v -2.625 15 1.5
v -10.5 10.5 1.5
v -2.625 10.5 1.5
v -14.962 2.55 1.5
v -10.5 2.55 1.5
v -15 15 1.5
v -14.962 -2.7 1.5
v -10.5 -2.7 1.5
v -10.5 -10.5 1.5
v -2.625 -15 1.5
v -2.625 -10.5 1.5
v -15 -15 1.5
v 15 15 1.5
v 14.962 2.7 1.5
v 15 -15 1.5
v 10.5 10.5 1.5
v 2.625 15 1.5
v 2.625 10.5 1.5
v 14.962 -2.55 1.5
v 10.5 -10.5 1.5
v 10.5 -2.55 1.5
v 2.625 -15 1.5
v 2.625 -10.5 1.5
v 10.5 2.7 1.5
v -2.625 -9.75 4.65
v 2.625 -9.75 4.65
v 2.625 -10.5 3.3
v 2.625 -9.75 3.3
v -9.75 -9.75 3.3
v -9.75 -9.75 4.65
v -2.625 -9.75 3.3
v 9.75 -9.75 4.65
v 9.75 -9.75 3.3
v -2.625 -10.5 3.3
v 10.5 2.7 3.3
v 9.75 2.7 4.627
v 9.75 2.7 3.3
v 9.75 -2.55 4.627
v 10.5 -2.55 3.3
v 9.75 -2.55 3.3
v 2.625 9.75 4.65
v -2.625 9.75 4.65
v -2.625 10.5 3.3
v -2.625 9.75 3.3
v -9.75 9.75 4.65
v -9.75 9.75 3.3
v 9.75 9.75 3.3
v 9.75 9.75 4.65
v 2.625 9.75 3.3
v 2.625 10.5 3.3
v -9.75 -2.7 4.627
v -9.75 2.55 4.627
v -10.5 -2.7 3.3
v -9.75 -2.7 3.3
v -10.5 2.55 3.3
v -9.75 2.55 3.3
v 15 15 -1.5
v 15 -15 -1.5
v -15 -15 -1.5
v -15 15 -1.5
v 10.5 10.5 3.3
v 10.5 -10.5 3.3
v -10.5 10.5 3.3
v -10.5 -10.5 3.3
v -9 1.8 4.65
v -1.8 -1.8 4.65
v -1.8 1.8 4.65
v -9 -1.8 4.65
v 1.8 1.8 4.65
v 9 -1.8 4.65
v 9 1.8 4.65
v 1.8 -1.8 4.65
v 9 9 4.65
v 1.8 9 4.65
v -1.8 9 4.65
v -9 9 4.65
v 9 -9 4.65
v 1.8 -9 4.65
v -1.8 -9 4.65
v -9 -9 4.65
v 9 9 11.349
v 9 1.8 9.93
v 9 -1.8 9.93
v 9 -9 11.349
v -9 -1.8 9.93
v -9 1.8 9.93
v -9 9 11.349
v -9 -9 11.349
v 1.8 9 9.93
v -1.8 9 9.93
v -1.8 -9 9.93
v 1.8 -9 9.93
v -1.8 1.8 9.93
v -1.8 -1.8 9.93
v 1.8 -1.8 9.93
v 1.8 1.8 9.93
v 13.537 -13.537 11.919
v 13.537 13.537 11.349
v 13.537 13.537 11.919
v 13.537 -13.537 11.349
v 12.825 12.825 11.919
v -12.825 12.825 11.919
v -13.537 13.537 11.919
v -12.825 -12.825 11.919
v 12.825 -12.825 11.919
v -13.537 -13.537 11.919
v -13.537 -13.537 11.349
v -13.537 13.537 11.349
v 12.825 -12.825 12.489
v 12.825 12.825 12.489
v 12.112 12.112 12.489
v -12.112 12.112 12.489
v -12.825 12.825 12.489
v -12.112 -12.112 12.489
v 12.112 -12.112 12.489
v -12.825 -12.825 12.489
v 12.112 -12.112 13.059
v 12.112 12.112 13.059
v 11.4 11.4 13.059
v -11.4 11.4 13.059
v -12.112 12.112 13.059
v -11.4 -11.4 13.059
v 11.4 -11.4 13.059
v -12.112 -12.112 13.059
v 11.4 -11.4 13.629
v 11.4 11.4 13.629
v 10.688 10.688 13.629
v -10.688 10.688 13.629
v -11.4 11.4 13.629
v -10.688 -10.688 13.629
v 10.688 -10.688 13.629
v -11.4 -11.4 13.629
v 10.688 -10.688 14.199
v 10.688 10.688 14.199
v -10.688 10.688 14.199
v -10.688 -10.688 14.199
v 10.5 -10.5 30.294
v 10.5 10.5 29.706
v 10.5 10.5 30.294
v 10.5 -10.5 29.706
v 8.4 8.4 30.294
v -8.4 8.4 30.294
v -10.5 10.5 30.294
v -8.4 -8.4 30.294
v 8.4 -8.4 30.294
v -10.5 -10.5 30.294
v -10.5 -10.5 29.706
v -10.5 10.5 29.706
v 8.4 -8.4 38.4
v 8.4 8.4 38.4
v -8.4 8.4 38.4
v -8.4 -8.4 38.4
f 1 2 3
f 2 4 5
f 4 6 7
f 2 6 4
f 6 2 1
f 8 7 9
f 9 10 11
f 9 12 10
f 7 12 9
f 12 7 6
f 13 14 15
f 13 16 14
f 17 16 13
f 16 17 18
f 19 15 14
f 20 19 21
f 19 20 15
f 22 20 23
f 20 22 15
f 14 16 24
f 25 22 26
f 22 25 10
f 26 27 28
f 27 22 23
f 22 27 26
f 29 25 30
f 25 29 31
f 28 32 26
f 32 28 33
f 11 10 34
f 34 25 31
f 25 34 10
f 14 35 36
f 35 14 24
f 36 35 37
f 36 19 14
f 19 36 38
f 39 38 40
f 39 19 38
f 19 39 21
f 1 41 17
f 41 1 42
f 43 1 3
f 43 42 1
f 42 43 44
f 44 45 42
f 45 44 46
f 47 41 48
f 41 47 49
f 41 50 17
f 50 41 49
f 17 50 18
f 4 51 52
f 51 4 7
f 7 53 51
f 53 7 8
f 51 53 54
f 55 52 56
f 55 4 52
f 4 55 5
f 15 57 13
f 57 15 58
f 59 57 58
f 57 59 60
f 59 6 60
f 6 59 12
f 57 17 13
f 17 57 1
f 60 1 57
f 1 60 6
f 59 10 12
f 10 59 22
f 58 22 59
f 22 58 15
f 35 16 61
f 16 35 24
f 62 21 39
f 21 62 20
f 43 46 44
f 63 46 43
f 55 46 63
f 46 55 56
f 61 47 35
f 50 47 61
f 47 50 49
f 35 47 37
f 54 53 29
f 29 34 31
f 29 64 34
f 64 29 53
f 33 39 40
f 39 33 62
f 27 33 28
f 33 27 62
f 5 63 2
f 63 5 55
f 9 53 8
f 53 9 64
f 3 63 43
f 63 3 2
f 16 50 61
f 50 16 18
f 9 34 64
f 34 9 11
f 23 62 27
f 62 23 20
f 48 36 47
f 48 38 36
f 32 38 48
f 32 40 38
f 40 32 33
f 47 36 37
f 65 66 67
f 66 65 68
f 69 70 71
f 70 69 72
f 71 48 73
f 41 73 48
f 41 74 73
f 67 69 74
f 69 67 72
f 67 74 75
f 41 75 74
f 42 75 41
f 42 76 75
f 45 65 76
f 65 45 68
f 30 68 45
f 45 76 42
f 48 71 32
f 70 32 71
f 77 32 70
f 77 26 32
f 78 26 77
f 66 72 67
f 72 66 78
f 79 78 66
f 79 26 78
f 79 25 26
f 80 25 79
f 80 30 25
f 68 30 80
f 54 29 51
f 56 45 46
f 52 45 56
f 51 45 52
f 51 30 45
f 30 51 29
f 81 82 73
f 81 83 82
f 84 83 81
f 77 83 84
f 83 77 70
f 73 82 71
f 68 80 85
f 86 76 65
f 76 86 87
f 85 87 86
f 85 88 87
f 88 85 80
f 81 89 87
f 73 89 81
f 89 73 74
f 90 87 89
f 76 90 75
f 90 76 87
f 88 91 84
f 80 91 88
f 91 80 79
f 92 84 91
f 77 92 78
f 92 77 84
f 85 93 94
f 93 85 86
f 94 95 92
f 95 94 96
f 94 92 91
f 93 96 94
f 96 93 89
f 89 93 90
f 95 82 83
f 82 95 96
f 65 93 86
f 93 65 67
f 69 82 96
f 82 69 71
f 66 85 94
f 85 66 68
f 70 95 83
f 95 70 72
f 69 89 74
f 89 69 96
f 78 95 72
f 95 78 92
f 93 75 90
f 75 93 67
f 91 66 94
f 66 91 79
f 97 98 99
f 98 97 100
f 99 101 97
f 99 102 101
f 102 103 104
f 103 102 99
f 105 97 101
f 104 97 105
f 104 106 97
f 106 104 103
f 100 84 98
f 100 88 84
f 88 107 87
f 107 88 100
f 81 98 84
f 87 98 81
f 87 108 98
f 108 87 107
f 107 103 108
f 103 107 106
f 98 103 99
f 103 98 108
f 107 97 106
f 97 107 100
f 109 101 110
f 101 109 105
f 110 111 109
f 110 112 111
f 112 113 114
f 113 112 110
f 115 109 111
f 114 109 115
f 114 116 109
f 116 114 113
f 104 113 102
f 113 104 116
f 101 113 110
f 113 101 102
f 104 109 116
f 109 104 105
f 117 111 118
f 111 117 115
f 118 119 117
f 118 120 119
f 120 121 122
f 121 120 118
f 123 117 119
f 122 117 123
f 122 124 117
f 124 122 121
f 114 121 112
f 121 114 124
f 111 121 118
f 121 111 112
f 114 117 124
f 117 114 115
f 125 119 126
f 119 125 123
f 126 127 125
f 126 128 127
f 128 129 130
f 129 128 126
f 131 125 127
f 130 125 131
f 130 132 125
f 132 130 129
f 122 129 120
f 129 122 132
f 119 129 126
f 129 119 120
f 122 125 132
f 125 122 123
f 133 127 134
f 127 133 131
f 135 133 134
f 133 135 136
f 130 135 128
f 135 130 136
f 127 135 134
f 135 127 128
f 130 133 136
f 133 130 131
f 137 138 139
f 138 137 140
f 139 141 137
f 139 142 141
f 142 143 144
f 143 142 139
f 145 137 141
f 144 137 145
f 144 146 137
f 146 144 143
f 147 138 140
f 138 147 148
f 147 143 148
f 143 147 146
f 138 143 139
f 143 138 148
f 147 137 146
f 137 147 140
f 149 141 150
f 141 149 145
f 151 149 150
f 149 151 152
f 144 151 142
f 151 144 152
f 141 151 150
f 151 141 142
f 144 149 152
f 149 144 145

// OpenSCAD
// Adjust base width
base_w = 30;

// Adjust level no.
lvl_no = 3;

module elongate(){
    for (i = [0 : $children-1]){
            scale([10 , 1, 1 ]) child(i);
    }
}

module prism(l, w, h){
    polyhedron(
        points=[[0,0,0], [l,0,0], [l,w,0], [0,w,0], [0,w,h], [l,w,h]],
        faces=[[0,1,2,3],[5,4,3,2],[0,4,5,1],[0,3,4],[5,2,1]]
    );
}

module pagoda_base(){
    b1_w = base_w;
    b2_w = base_w*0.7;
    b3_w = base_w*0.65;
    
    st_w = (b1_w - b3_w) / 2;
    st_l = b2_w * 0.25;
    st_h = b1_w *1.05 / 10;
    
    tx = [-1, 5.7, 1, -5.7];
    ty = [-1, -0.17, 1, 0.17];
    
    union(){
        //Base 1
        cube([base_w,base_w,base_w/10],center=true);
        
        //Base 2
        translate([0,0,base_w*0.7/10]){
            cube([b2_w,b2_w,base_w*0.8/10],center=true);
        }
        
        //Base 3
        translate([0,0,2* base_w*0.6/10]){
            cube([b3_w,b3_w,base_w*0.7/10],center=true);
        }
        
        //Stairs
        for (i = [0:3]) {
            translate([tx[i] * st_w/2, ty[i] * b1_w/2, b1_w/20]){
                rotate(a = 90  * i) prism(st_l,st_w,st_h);
            }
        }
    }
}

module pagoda_body(b_w){
    body_w = b_w * 0.6;
    body_h = body_w * 0.7; 
    
    roof_w = b_w * 0.95;
    thicc = roof_w*0.1;
    union(){
        
        difference(){
            cube([body_w, body_w, body_h],center = true);
            cube([body_w*1.1, body_w * 0.2, body_h * 0.6],center=true);
            cube([body_w*0.2, body_w * 1.1, body_h * 0.6],center=true);
        };
        
        
        translate([0,0,body_h*0.39]){
            thicc = thicc * 0.2;
            union(){
            for (i = [1:5]){
                translate([0,0, thicc*i]){
                    cube([roof_w * (1-(0.05*i)),roof_w * (1-(0.05*i)),thicc],center=true);
                }
            } 
            }
        }

    }  
}

module pagoda_recur_body(b_w){
    body_w = b_w * 0.7;
    body_h = body_w * 0.4; 
    
    roof_w = b_w * 0.98;
    thicc = roof_w*0.1;
    union(){
        cube([body_w, body_w, body_h * 0.07],center=true);
        
        translate([0,0,body_h/2])
            cube([body_w * 0.8,body_w * 0.8, body_h], center=true);
        
        for (i = [0:11]){
            
        }
    }
}


// RECURSIVE
module pagoda_recur(lvl){
    recur_w = base_w * (0.6 - (0.05 * (lvl_no - lvl)));
    recur_h = base_w * 0.6;
    if (lvl) {
        
    } else {
        
    }
}


// MAIN
module pagodadadadada(){
    offset_body_base = (base_w *1.05 / 10) + (base_w/10);
    offset_recur_base = 0;

    pagoda_base();
    
    translate([0,0,offset_body_base]) pagoda_body(base_w);
    
    translate([0,0,30]) pagoda_recur_body(base_w);
}


pagodadadadada();
